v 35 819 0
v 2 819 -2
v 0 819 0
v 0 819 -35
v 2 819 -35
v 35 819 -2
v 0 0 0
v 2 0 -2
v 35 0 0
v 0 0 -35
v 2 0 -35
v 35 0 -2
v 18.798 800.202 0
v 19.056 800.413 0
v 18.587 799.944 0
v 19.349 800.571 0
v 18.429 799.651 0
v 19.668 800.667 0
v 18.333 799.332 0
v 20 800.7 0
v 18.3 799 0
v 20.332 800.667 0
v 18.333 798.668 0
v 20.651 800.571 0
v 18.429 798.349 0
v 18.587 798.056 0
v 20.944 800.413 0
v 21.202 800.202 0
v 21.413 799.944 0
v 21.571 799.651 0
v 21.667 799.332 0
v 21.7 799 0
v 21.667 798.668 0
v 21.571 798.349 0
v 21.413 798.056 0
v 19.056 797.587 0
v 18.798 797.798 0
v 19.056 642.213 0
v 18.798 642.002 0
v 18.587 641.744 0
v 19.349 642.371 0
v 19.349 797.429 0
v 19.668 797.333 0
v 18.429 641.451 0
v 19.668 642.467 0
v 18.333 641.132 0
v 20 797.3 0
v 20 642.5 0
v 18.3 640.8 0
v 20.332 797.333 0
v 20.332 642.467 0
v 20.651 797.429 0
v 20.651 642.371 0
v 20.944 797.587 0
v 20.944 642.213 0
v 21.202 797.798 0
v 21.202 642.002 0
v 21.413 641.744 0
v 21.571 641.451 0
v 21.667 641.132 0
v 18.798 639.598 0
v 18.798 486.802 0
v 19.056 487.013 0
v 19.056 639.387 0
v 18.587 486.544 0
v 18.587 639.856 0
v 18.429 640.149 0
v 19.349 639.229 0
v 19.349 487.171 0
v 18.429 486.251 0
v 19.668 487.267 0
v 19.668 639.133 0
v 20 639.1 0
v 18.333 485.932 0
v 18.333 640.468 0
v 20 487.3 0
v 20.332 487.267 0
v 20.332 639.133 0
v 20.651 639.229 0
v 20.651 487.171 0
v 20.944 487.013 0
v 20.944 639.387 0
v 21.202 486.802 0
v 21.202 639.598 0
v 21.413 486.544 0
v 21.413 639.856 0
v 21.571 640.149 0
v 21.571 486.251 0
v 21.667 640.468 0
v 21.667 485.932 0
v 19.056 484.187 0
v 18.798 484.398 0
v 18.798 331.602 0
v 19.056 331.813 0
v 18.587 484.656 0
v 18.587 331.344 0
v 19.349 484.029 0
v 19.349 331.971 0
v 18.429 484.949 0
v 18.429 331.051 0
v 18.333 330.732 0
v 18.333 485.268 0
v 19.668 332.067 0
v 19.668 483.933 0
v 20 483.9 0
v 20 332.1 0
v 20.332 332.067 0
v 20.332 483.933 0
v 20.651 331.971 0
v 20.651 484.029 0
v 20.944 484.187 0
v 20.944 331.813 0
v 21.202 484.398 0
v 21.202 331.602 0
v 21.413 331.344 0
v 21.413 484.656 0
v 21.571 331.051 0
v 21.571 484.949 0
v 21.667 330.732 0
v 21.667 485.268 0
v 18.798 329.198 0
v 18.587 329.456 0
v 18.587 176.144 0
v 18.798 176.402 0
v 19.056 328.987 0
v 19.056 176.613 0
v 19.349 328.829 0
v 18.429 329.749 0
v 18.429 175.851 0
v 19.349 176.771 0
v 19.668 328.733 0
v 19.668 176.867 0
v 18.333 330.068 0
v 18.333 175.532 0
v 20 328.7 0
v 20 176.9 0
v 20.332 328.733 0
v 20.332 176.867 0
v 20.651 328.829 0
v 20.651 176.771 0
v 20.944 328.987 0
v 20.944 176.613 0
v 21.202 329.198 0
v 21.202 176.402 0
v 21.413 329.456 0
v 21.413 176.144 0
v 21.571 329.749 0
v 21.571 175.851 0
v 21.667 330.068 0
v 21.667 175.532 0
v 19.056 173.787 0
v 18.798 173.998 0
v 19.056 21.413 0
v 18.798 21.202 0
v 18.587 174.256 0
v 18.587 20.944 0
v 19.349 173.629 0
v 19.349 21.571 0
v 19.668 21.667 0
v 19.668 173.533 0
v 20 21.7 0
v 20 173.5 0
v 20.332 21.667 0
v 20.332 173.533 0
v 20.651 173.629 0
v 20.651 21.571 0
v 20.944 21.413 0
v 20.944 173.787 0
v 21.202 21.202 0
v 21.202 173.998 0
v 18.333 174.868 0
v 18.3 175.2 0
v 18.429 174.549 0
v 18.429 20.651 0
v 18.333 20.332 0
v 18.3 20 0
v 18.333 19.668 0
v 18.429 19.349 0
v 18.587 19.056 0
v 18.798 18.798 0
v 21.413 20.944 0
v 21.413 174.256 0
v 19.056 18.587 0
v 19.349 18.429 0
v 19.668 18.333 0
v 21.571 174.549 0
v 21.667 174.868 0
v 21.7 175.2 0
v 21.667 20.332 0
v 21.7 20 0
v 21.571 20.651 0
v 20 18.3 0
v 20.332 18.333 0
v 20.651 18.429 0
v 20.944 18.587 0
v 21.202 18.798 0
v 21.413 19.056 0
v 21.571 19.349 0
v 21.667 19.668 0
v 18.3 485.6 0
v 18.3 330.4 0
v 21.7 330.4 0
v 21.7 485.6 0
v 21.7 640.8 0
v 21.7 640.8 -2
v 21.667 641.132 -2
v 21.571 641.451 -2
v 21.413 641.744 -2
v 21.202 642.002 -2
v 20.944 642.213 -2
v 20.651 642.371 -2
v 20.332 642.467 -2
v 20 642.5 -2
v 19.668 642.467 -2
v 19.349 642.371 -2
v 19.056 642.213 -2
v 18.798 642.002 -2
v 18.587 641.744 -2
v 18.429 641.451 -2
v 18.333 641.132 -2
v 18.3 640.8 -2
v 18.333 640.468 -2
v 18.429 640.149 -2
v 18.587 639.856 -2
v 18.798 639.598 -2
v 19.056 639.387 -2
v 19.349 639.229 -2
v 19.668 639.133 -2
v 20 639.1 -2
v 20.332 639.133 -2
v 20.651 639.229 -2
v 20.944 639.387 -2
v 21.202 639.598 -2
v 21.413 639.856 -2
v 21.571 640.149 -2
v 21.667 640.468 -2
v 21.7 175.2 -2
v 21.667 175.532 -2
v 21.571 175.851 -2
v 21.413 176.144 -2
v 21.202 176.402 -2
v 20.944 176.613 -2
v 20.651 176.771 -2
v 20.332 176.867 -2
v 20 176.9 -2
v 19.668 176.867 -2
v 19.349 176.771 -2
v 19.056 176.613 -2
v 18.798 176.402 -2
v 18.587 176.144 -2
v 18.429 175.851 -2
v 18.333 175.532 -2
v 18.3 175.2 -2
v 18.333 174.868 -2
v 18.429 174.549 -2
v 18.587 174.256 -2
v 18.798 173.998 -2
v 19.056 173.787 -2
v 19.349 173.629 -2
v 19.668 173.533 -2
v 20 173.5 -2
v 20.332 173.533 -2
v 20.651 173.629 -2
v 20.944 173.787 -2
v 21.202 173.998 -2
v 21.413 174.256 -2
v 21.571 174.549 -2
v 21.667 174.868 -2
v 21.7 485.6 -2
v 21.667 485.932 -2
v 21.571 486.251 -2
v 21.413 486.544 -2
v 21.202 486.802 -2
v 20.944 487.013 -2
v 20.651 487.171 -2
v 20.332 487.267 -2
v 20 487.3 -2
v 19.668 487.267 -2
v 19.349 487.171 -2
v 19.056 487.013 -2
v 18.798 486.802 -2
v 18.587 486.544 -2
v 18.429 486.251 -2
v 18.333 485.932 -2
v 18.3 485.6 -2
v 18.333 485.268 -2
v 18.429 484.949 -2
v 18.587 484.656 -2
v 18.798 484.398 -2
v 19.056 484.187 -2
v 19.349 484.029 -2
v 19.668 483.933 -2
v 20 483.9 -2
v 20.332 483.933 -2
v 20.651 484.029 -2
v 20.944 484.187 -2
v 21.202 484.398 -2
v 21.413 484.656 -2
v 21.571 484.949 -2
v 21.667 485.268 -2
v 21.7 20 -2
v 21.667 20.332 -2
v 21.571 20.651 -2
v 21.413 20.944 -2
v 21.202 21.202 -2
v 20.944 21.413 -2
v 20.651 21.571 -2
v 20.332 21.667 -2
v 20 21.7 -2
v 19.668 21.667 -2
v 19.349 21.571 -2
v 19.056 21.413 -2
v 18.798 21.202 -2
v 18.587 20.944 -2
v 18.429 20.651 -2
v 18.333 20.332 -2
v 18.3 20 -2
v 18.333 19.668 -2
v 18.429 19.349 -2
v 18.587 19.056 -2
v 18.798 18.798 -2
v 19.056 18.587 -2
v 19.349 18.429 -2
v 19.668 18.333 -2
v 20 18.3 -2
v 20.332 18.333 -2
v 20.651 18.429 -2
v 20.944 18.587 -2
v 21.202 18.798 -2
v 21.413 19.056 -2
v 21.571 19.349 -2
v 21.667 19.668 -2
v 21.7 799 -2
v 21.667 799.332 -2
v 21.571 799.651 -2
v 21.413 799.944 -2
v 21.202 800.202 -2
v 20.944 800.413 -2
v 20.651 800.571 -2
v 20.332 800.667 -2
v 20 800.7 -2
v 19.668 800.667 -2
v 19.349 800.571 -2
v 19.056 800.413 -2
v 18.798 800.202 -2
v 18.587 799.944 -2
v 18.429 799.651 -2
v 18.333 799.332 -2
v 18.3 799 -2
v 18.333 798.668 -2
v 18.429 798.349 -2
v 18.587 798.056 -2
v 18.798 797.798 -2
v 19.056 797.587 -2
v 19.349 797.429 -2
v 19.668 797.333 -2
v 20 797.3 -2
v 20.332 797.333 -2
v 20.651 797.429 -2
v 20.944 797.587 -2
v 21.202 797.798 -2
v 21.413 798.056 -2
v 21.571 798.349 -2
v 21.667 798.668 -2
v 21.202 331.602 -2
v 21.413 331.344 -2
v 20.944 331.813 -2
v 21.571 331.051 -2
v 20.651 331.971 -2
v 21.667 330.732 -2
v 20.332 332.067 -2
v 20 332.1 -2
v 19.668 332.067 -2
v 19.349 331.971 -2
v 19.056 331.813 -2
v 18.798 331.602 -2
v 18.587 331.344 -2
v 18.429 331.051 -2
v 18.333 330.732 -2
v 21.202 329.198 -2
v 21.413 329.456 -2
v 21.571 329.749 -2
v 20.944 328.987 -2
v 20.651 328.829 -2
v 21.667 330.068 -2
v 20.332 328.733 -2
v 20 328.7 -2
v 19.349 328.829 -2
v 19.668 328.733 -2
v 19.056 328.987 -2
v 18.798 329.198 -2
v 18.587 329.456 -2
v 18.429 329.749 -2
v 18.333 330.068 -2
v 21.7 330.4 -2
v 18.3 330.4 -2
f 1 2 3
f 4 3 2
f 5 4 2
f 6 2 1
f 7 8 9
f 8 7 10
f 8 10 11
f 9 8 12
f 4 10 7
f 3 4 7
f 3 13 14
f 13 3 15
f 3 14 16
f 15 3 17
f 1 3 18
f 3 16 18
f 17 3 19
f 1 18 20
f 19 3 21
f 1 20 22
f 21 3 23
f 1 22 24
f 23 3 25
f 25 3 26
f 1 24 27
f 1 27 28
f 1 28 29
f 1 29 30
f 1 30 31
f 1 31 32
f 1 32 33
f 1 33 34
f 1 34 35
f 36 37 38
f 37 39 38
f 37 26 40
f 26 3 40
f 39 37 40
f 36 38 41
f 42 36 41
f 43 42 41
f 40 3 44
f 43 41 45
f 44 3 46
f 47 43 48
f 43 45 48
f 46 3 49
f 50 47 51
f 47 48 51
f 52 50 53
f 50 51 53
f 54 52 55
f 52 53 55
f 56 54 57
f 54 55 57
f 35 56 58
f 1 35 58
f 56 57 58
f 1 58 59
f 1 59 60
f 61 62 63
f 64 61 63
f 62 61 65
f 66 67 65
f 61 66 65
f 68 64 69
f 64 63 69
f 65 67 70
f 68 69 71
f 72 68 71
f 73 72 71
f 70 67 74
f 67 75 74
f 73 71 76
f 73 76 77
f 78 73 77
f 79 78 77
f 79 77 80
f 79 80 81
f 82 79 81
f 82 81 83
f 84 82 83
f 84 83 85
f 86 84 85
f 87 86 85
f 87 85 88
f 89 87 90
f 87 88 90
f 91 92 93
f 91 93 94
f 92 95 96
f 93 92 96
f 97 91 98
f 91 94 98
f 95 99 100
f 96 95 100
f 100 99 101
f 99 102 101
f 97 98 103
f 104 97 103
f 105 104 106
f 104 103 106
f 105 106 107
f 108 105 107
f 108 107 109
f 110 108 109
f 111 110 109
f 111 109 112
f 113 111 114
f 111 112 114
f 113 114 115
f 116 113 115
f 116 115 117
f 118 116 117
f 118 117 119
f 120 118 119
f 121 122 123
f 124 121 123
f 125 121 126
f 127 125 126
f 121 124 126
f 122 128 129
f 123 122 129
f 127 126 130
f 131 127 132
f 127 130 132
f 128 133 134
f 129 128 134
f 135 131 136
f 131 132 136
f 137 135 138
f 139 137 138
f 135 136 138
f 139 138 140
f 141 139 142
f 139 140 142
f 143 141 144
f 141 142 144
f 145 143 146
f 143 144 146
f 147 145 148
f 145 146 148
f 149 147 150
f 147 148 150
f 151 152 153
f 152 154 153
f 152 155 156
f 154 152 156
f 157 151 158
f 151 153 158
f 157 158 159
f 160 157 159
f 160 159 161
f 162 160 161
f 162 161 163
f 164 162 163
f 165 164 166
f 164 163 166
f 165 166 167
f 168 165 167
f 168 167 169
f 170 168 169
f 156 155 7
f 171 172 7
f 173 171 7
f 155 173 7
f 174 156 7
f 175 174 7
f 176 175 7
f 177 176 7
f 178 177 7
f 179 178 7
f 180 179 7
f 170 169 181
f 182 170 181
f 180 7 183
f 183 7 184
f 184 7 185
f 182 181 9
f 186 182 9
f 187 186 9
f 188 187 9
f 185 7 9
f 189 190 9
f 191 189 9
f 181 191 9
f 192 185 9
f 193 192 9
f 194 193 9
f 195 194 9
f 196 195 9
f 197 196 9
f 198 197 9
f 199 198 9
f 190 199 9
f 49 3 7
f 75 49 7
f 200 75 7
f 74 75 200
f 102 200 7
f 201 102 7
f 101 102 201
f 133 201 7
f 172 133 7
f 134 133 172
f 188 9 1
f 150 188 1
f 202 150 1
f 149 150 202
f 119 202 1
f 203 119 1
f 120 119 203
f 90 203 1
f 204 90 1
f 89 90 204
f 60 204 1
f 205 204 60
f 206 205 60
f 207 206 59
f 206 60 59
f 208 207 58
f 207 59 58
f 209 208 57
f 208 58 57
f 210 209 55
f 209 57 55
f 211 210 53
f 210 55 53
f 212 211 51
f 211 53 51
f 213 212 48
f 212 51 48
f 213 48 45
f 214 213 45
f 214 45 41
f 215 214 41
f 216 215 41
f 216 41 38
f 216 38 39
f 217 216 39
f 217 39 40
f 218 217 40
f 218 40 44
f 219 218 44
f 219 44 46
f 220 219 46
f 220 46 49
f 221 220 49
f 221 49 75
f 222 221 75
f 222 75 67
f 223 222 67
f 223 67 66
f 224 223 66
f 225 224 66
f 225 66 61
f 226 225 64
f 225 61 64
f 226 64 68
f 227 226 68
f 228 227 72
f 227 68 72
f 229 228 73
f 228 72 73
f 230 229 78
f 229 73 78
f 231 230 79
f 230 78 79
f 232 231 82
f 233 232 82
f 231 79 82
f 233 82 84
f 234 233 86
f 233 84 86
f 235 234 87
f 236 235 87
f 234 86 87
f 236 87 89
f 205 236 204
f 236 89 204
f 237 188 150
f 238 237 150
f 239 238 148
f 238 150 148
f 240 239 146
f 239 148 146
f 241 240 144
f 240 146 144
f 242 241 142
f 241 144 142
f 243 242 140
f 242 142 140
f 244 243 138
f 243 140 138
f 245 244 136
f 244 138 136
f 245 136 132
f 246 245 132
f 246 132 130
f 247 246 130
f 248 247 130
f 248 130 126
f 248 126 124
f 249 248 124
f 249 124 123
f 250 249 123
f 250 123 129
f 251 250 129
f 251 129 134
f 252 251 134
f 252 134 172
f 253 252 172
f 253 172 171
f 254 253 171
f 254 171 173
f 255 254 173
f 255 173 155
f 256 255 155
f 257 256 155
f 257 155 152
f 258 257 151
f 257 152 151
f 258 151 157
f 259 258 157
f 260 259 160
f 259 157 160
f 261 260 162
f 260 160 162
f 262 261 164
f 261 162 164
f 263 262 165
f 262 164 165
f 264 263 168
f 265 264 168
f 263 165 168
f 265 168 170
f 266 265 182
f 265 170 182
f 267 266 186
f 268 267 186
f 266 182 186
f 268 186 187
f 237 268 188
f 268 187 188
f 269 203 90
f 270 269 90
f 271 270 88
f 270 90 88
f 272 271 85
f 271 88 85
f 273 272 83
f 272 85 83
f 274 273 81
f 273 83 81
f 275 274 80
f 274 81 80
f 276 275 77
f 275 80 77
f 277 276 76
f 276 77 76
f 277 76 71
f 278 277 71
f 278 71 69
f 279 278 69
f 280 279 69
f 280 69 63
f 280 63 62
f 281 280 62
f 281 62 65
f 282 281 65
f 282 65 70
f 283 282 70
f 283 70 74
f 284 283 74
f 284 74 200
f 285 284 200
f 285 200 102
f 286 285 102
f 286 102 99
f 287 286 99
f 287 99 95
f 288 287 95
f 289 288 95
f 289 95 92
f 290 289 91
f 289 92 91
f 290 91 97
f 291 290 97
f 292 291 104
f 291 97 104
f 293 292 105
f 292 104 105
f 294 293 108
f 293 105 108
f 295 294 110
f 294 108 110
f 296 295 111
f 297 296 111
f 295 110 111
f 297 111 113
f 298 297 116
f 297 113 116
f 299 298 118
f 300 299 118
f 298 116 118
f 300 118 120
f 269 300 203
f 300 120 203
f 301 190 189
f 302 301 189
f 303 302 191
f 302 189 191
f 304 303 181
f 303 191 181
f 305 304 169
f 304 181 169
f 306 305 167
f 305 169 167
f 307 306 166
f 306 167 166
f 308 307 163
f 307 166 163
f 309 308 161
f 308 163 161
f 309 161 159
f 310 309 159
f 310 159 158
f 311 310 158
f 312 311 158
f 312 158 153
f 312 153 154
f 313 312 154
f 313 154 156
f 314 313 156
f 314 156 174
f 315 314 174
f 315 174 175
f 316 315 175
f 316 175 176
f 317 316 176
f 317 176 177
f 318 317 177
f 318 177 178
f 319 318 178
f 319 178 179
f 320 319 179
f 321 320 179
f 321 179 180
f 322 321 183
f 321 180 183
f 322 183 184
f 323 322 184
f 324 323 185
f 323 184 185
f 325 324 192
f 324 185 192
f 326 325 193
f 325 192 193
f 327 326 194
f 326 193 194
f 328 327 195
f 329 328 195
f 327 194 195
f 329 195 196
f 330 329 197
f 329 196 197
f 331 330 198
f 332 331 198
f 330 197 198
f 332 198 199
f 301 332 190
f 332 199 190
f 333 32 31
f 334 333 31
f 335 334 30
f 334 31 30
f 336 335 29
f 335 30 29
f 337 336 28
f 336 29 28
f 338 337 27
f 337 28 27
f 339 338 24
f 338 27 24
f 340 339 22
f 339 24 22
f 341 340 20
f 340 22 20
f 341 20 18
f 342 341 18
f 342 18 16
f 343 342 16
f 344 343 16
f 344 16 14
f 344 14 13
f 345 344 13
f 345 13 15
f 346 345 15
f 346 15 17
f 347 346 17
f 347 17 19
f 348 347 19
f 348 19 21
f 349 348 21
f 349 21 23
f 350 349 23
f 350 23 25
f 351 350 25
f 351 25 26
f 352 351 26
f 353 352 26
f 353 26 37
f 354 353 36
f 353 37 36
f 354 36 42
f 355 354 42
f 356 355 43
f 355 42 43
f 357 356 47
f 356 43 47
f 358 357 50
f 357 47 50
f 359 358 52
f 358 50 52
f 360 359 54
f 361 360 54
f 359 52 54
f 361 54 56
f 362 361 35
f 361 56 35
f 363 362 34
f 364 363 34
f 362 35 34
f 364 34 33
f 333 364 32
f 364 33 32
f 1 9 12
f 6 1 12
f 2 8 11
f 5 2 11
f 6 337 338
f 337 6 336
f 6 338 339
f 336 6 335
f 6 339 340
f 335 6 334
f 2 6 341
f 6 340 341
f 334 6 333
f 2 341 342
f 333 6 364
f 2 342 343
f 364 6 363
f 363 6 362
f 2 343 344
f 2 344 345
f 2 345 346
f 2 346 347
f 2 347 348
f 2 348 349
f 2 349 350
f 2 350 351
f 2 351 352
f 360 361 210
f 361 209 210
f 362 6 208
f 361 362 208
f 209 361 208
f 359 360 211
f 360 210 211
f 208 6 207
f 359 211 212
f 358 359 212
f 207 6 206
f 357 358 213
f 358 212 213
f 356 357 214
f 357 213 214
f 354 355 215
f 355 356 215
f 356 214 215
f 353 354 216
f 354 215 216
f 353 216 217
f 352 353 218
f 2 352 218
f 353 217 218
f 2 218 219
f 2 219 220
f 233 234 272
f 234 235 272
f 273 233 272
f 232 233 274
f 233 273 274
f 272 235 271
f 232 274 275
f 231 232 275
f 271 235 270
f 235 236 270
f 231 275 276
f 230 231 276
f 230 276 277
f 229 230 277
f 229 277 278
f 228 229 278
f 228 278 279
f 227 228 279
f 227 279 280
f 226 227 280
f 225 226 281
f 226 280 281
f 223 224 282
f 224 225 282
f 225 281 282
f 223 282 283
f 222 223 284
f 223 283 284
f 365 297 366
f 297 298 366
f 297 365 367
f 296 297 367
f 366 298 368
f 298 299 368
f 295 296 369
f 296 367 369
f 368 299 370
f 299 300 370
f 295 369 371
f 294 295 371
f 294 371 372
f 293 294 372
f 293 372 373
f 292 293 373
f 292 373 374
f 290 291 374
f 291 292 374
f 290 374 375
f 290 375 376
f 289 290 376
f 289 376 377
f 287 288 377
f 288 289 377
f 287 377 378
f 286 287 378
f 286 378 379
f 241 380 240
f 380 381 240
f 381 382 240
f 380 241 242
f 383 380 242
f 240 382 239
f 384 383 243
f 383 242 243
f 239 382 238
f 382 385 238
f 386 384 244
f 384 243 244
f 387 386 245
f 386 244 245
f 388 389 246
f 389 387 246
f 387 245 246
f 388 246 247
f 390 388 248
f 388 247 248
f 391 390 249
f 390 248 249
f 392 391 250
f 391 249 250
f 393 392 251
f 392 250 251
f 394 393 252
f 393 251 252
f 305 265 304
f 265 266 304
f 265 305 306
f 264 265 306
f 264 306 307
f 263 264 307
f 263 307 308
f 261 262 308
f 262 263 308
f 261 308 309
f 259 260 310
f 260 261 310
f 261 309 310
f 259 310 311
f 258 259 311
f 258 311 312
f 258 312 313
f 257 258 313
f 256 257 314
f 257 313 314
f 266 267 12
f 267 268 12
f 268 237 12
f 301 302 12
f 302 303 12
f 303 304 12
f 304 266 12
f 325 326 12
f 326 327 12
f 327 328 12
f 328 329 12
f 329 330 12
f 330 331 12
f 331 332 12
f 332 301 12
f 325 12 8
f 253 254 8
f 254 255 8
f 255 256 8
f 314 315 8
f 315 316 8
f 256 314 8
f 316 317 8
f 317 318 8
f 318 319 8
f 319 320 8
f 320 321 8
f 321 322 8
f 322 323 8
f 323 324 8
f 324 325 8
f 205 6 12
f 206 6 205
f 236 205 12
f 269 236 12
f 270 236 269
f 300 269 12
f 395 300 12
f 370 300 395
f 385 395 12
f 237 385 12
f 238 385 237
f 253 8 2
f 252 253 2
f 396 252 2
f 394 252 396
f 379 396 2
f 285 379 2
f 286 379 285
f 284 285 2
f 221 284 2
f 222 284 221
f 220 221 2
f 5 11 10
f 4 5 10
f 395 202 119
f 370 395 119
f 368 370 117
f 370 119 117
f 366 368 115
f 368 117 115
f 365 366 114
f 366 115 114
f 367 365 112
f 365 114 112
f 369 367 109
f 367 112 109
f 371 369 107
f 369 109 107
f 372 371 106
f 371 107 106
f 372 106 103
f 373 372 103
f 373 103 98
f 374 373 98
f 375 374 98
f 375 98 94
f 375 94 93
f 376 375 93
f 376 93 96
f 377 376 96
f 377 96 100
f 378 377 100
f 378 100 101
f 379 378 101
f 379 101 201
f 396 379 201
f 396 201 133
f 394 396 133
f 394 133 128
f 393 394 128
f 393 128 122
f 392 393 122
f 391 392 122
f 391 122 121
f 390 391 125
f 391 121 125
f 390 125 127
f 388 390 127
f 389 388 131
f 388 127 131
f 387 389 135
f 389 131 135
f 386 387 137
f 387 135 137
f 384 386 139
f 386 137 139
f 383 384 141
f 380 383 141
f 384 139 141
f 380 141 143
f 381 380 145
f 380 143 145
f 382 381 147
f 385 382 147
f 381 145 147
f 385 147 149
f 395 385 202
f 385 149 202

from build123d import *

# Parameters (mm, degrees)
ESTRUSIONE_ESTRUSIONE1_DEPTH = 819
SCHIZZO3_R                   = 1.7
TAGLIO_ESTRUSIONE1_DEPTH     = 821.494363174


with BuildPart() as part:
    # Schizzo2 → Estrusione-Estrusione1 (new body)
    with BuildSketch(Plane(origin=(0, 0, 0), x_dir=(1, 0, 0), z_dir=(0, 1, 0))):
        Polygon((0, 0), (35, 0), (35, 2), (2, 2), (2, 35), (0, 35), align=None)
    extrude(amount=ESTRUSIONE_ESTRUSIONE1_DEPTH)

    # Schizzo3 → Taglio-Estrusione1 (cut, through all)
    with BuildSketch(Plane.XY):
        with Locations((20, 20)):
            Circle(SCHIZZO3_R)
        with Locations((20, 330.4)):
            Circle(SCHIZZO3_R)
        with Locations((20, 485.6)):
            Circle(SCHIZZO3_R)
        with Locations((20, 175.2)):
            Circle(SCHIZZO3_R)
        with Locations((20, 640.8)):
            Circle(SCHIZZO3_R)
        with Locations((20, 799)):
            Circle(SCHIZZO3_R)
    extrude(amount=-TAGLIO_ESTRUSIONE1_DEPTH, mode=Mode.SUBTRACT)


solid = part.part
